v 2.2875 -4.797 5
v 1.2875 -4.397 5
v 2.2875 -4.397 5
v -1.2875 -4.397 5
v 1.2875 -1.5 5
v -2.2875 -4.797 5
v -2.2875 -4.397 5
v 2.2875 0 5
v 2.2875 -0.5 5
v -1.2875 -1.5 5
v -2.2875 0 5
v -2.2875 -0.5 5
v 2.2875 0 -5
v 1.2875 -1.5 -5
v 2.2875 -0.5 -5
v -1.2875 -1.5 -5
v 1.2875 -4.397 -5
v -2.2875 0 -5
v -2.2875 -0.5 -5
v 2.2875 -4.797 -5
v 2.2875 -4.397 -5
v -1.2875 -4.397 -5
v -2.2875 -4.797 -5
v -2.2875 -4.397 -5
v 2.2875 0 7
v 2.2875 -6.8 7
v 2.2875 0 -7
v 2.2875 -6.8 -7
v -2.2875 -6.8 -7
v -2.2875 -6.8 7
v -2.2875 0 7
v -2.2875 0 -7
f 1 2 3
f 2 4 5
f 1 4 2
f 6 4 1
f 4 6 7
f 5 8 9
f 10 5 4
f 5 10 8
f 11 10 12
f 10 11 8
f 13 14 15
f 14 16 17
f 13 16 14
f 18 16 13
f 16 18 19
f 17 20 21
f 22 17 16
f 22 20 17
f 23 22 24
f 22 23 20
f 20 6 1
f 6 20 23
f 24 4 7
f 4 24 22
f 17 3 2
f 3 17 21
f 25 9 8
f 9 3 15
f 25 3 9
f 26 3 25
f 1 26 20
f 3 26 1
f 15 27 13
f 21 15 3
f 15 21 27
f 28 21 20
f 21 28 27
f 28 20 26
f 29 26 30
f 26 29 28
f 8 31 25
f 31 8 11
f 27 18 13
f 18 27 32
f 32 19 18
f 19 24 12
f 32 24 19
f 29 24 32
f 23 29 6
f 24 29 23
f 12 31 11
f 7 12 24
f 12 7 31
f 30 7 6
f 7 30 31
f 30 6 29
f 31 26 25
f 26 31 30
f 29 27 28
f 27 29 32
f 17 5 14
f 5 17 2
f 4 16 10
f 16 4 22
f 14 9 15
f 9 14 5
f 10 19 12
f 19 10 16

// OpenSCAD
// file: common.scad
$fa = 10;
$fs = 0.2;
eps = 0.003;
$zstep = 0.2;

// An inward chamfer sufficient to prevent elephant's foot.
foot = 0.4;

// FINDINGS FROM CLEARANCE TEST
//
// Consider a vertical hole of width X, a layer height of 0.2, and a vertical
// post.
//   * A post of diameter X will not fit in.
//   * A post of diameter X-0.1 will fit in, but is very hard to slide in or out.
//     This is probably due mostly to the transverse grain of the print.
//     It will rotate, but with some resistance.
//   * A post of diameter X-0.2 slides in and out easily. It rotates easily, but
//     still has noticeable resistance at some points.
//   * A post of diameter X-0.3 rotates freely. It also has noticeable play
//     from side to side.
//
// Clearances are expressed as the total across both sides of a joint.
tight = 0.1;  // Intended for stationary joints.
snug = 0.2;   // Moves, but with some resistance.
loose = 0.3;  // Free movement.
extra_loose = 0.4;

// A brim is a 0.2mm layer printed near an edge which is likely to warp.
// The edge should be chamfered outwards at 45 degrees. The brim should
// be placed this far from the bottom of the edge, so it barely touches
// the chamfer.
brim_offset = 0.3;

// Menards 5/8 x 2-3/4 x 0.04 WG compression spring.
spring_od = 5/8 * 25.4;
// Subtract 10 from the relaxed length so everything is slightly tensioned
// all the time.
spring_max_length = 2.75 * 25.4 - 10;
spring_min_length = 16;  // Approximate.

// Menards 1/4 inch aluminum rod.
roller_diameter = 6.7;
roller_cavity_diameter = roller_diameter + loose;

// 550 paracord. Make this wide enough to accommodate a melted end.
string_diameter = 4.5;

// Standard spring tube.
tube_id = spring_od + 0.7;

module octagon(diameter) {
  intersection_for(a = [0, 45])
    rotate([0, 0, a])
      square(diameter, center=true);
}

// A cylinder with chamfered or flared ends, useful for dealing with
// elephant's foot on pins or holes.
module flare_cylinder(height, radius, flare_top, flare_bottom) {
  translate([0, 0, abs(flare_bottom)-eps])
    cylinder(height-abs(flare_bottom)-abs(flare_top)+eps, radius, radius);

  // Bottom flare.
  linear_extrude(abs(flare_bottom), scale=radius/(radius-flare_bottom))
    circle(radius-flare_bottom);
  
  // Top flare.
  translate([0, 0, height-abs(flare_top)])
    linear_extrude(abs(flare_top), scale=(radius-flare_top)/radius)
      circle(radius);
}

// A cube with a chamfered or flared bottom end, useful for dealing
// with elephant's foot on pins or holes.
module flare_cube(dims, flare) {
  translate([0, 0, abs(flare)-eps])
    cube([dims.x, dims.y, dims.z - abs(flare) + eps]);

  translate([dims.x/2, dims.y/2, 0])
    linear_extrude(abs(flare), scale=[dims.x/(dims.x-2*flare), dims.y/(dims.y-2*flare)])
      translate([-(dims.x-2*flare)/2, -(dims.y-2*flare)/2, abs(flare)-eps])
        square([dims.x-2*flare, dims.y-2*flare]);
}

// An approximate circle which can be printed on its side.
module circle_ish(r) {
  // Safe overhang angle.
  q = 45;
  
  intersection() {
    // Add 0.2 (one print layer) in case the bridge is messy and hangs
    // down.
    square(2*r+0.2, center=true);
    hull() {
      circle(r);
      for (a = [-1, 1])
        translate([0, a*r/cos(q), 0])
          square(eps, center=true);
    }
  }
}

// Depth of the sockets used as glue aids.
socket_depth = 5;

module socket() {
  translate([-1.5, -1.5, -eps])
    flare_cube([3, 3, socket_depth], -foot);
}

module lug() {
  flare_cube([3-snug, 3-snug, 2*socket_depth-2], foot);
}

// Nerf darts are 0.50 cal.
dart_diameter = 12.7;
dart_length = 72;

module octahedron(major_radius=1) {
  // Top and bottom halves.
  for (a = [-1, 1])
    scale([1, 1, a])
      // Extrude a square into a pyramid.
      linear_extrude(major_radius, scale=0)
        rotate([0, 0, 45])
          square(sqrt(2)*major_radius, center=true);
}

module chamfered_cube(dims, chamfer=1) {
  assert(dims.x >= 2*chamfer);
  assert(dims.y >= 2*chamfer);
  assert(dims.z >= 2*chamfer);

  hull()
    for (a = [0, 1], b = [0, 1], c = [0, 1])
        translate([
          (dims.x - 2*chamfer) * a + chamfer,
          (dims.y - 2*chamfer) * b + chamfer,
          (dims.z - 2*chamfer) * c + chamfer
        ])
          octahedron(chamfer);
}
// main file
// Retention claw for 1/8" steel pins.

include <common.scad>

pin_diameter = 3.175;
pinch = 0.6;
pin_cavity_width = pin_diameter - pinch;

pillar_thickness = 2;
spring_thickness = 1;
exterior_width = 2*spring_thickness + pin_cavity_width;

pillar_length = 2;
spring_length = 10;
exterior_length = 2*pillar_length + spring_length;

pin_cavity_height = 4;
separation = 0.4;
plate_height = 2;
exterior_height = pin_cavity_height + 2*separation + plate_height;

module claw() {
  difference() {
    translate([-exterior_width/2, -exterior_length/2, 0])
      cube([exterior_width, exterior_length, exterior_height]);
    
    // Central cavity.
    translate([-pin_cavity_width/2, -spring_length/2, -eps])
      cube([pin_cavity_width, spring_length, exterior_height - plate_height]);
    
    // Separations around the spring.
    for (z = [0, pin_cavity_height + separation])
      translate([-exterior_width/2 - 1, -spring_length/2, z-eps])
        cube([exterior_width + 2, spring_length, separation]);
    
    // Bevels to admit the pin.
    rotate([0, 45, 0]) {
      cube([
        (exterior_width+spring_thickness)/sqrt(2),
        spring_length,
        (exterior_width+spring_thickness)/sqrt(2)
      ], center=true);
    }
  }
}

module claw_print() {
  rotate([90, 0, 0])
    claw();
}

claw_print();
